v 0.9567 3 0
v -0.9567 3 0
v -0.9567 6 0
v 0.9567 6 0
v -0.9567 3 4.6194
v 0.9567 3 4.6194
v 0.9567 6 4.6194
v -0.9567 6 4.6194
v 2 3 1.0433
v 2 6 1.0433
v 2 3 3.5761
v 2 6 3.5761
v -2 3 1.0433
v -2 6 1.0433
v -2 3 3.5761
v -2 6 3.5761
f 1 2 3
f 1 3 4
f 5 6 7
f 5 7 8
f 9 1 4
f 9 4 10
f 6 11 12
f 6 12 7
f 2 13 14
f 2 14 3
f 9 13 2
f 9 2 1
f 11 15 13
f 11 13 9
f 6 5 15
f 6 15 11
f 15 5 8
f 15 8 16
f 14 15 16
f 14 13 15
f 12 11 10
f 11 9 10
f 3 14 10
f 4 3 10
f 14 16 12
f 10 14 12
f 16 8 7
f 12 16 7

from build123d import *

# Parameters (mm, degrees)
BOX_W            = 4
BOX_H            = 4
BOX_DEPTH        = 10
EXTRUDE003_DEPTH = 3


with BuildPart() as box:
    # Box → Box (new body)
    with BuildSketch(Plane(origin=(-2, 2.8, 0), x_dir=(1, 0, 0), z_dir=(0, 0, 1))):
        with Locations((2, 2)):
            Rectangle(BOX_W, BOX_H)
    extrude(amount=BOX_DEPTH)


with BuildPart() as common:
    # Sketch002 → Extrude003 (new body)
    with BuildSketch(Plane.XZ):
        Polygon((2.309699, 1.35299), (2.309699, 3.266407), (0.956709, 4.619398), (-0.956709, 4.619398), (-2.309699, 3.266407), (-2.309699, 1.35299), (-0.956709, 0), (0.956709, 0), align=None)
    extrude(amount=-EXTRUDE003_DEPTH)


with BuildPart() as common_1:
    # Extrude003 placement: moved
    add(common.part.moved(Location((0, 3, 0))))

    # Common: intersect Box
    add(box.part, mode=Mode.INTERSECT)


solid = common_1.part
